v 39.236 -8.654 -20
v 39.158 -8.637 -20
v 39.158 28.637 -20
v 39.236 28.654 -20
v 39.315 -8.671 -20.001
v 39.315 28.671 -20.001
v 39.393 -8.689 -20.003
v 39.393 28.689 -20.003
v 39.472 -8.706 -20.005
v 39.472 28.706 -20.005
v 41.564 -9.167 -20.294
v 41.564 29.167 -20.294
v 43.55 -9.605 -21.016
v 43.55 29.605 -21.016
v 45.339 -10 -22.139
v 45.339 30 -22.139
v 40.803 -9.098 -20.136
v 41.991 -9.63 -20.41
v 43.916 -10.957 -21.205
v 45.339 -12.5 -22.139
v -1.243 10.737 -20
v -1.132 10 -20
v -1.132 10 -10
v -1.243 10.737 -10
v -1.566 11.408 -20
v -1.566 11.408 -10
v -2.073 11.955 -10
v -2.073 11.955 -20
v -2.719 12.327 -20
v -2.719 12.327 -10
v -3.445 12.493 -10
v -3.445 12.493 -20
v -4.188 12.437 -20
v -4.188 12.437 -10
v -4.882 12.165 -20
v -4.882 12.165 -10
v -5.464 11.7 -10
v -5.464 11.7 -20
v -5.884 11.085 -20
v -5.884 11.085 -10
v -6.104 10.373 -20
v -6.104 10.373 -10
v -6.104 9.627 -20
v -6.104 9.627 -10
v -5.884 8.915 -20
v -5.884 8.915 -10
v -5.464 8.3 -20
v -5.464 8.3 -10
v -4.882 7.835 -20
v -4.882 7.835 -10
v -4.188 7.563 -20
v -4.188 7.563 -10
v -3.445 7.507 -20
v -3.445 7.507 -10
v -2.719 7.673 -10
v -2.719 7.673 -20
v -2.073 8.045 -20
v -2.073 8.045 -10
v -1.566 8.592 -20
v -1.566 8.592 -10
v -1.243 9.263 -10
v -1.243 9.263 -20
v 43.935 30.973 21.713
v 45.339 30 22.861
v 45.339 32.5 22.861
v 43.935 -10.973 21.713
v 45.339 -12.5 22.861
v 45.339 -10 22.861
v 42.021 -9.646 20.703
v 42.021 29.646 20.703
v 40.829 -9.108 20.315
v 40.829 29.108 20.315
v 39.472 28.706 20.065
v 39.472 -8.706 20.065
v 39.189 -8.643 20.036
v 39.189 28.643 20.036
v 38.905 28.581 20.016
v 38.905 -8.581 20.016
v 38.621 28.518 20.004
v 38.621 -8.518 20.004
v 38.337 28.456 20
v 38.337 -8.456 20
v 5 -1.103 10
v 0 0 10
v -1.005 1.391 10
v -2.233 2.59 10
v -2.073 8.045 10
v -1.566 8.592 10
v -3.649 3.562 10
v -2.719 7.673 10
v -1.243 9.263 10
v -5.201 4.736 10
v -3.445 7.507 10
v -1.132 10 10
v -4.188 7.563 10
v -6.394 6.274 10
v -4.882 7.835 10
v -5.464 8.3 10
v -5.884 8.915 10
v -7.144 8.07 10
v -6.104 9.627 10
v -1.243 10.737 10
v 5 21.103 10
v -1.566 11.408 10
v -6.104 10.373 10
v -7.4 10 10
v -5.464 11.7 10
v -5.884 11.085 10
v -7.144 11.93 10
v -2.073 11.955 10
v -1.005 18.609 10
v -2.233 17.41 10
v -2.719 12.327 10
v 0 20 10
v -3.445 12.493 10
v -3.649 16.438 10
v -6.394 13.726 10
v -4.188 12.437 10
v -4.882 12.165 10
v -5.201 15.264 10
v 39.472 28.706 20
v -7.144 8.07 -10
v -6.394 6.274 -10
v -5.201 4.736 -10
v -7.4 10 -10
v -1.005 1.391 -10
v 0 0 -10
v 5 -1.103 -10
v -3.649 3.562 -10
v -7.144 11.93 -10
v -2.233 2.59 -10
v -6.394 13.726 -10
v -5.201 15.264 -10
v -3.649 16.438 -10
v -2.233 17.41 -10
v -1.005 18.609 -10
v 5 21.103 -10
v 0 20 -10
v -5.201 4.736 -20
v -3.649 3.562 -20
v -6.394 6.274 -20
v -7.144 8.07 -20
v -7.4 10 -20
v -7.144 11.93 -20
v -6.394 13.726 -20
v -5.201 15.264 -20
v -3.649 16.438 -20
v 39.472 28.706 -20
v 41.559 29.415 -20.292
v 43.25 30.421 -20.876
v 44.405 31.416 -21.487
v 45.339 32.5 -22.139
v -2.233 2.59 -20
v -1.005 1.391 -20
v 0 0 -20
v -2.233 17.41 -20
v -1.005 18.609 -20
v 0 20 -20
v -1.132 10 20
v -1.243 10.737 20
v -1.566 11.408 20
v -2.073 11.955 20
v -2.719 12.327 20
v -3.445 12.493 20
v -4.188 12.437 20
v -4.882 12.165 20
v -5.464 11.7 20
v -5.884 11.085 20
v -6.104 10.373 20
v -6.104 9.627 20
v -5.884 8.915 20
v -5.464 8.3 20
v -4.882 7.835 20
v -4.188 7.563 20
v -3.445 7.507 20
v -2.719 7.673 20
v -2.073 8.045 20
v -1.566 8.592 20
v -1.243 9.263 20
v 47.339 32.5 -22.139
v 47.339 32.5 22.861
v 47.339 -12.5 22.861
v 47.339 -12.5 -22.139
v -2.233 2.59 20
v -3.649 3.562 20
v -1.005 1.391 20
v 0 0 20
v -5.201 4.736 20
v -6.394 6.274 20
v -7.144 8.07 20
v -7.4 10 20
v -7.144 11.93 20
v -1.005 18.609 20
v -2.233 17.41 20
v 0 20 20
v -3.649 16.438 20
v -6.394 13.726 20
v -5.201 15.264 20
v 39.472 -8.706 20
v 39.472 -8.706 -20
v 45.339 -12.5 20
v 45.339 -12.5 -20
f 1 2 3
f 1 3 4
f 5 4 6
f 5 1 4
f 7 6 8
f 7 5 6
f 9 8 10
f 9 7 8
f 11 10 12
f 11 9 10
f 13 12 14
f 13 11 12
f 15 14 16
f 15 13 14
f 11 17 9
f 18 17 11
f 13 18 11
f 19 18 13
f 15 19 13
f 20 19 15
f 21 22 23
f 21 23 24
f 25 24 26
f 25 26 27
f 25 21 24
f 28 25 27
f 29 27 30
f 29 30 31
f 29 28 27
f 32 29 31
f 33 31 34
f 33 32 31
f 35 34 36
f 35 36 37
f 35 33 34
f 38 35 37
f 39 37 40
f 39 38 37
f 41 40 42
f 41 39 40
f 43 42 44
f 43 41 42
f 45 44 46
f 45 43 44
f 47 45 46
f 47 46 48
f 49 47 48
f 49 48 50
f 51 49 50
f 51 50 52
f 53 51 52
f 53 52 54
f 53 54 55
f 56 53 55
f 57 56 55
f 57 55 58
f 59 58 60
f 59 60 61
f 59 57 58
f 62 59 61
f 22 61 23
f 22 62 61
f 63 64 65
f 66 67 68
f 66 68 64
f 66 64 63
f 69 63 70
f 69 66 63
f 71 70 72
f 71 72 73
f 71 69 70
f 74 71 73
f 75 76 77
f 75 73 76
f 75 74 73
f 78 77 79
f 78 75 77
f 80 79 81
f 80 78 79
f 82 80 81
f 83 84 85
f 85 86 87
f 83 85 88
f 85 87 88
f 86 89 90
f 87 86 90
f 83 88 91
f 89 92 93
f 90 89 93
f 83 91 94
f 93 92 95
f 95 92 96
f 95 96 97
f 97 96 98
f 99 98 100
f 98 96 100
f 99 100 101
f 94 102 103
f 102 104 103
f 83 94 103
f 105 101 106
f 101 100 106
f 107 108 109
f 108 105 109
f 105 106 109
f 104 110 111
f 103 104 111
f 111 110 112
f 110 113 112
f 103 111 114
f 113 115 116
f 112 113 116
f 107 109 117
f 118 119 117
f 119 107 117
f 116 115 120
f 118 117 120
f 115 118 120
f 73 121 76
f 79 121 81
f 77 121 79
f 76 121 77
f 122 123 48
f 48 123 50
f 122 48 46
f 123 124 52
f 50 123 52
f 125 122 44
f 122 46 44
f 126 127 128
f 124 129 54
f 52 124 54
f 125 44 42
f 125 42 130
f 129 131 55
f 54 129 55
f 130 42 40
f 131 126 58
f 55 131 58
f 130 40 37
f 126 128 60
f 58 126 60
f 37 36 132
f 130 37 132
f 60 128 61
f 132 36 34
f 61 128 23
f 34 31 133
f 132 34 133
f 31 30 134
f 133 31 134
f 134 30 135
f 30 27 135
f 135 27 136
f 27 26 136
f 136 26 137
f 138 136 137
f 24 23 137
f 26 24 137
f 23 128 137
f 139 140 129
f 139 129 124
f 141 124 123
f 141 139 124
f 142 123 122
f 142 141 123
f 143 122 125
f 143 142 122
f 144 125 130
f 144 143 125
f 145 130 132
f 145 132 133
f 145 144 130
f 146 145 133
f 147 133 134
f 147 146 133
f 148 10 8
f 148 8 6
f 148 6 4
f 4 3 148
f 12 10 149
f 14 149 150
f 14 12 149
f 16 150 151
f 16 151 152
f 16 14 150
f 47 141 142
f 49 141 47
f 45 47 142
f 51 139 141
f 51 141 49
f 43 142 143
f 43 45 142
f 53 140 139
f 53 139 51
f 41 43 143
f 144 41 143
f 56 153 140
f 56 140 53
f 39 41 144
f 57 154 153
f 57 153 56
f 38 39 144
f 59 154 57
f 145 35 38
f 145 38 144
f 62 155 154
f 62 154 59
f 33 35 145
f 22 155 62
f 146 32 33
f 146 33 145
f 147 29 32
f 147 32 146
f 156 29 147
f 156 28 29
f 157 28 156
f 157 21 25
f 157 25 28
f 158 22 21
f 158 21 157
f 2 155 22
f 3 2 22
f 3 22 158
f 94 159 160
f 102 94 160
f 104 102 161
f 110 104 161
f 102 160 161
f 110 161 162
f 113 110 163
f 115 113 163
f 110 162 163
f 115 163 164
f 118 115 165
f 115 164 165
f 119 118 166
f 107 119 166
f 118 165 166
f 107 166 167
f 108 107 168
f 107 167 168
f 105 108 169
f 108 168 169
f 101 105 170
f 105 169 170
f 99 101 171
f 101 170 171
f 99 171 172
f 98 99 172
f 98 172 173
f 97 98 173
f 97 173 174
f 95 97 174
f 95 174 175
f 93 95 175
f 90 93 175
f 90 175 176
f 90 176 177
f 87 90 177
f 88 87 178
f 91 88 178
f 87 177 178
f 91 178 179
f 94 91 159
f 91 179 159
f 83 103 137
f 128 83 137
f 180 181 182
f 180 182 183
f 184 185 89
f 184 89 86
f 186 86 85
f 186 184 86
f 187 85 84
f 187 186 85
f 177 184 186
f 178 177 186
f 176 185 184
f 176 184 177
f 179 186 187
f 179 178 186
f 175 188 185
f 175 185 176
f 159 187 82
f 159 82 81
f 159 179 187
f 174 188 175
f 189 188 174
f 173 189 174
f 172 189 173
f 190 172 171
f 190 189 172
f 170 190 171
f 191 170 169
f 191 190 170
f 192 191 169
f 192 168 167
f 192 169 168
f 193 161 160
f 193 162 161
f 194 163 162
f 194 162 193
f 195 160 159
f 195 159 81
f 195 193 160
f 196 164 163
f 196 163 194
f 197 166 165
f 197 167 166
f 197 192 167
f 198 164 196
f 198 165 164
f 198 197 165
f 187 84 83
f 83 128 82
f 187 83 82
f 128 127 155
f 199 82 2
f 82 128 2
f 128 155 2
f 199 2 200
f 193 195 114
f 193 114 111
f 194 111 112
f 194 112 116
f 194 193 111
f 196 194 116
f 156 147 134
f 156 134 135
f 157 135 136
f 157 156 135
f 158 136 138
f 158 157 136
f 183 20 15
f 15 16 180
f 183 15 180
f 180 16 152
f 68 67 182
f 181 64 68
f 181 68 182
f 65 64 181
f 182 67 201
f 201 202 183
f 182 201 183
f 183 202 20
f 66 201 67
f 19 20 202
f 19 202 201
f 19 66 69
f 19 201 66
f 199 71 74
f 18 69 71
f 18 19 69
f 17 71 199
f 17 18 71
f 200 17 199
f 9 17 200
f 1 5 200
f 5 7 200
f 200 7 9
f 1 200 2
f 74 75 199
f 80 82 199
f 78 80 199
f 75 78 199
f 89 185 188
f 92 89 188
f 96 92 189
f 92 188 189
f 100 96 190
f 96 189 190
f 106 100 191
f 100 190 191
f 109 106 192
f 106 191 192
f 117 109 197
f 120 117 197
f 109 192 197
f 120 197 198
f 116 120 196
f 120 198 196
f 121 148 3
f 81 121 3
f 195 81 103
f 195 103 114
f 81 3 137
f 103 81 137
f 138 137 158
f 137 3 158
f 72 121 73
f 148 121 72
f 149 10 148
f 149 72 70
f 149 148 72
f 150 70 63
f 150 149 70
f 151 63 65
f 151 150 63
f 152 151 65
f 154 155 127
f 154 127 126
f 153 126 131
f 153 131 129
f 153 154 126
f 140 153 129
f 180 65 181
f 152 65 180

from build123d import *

# Parameters (mm, degrees)
BOSS_EXTRUDE1_DEPTH      = 20
BOSS_EXTRUDE1_DEPTH_BACK = 20
SKETCH2_W                = 45
SKETCH2_H                = 45
BOSS_EXTRUDE2_DEPTH      = 2
SKETCH3_R                = 2.5
BOSS_EXTRUDE3_DEPTH      = 10
FILLET1_R                = 10
FILLET2_R                = 10
FILLET1_OF_MIRROR1_R     = 10
CUT_EXTRUDE1_DEPTH       = 5


with BuildPart() as part:
    # Sketch1 → Boss-Extrude1 (new, two sides: drawn at the far end of the back side and taken through both)
    with BuildSketch(Plane.XY.offset(-BOSS_EXTRUDE1_DEPTH_BACK)):
        Polygon((0, 0), (45.339322565, -10), (45.339322565, 30), (0, 20), align=None)
    extrude(amount=BOSS_EXTRUDE1_DEPTH + BOSS_EXTRUDE1_DEPTH_BACK)

    # Sketch2 → Boss-Extrude2 (add)
    with BuildSketch(Plane(origin=(45.339322565, 0, 0), x_dir=(0, 0, -1), z_dir=(1, 0, 0))):
        with Locations((-0.360618032, 10)):
            Rectangle(SKETCH2_W, SKETCH2_H)
    extrude(amount=BOSS_EXTRUDE2_DEPTH)

    # Sketch3 → Boss-Extrude3 (add)
    with BuildSketch(Plane.XY.offset(20)):
        with BuildLine():
            Line((0, 17.400398526), (0, 2.599601474))
            ThreePointArc((0, 2.599601474), (-7.400398526, 10), (0, 17.400398526))
        make_face()
        with Locations((-3.63186502, 10)):
            Circle(SKETCH3_R, mode=Mode.SUBTRACT)
    boss_extrude3 = extrude(amount=-BOSS_EXTRUDE3_DEPTH)

    # Fillet1
    # the kernel refuses this fillet: 10 mm, written as the material it adds along each edge
    with BuildSketch(Plane(origin=(0, 17.400398526, 20), x_dir=(0, 1, 0), z_dir=(0, 0, -1))) as fillet1_piece_1:
        with BuildLine():
            CenterArc((7.738294917, -8.578684614), FILLET1_R, 120.92191029, 29.539044855)
            Line((-0.961904346, -3.64851902), (-1.135908331, -3.549915708))
            ThreePointArc((-1.135908331, -3.549915708), (-0.437907417, -1.835607933), (-0.2, 0))
            Line((-0.2, 0), (0, 0.2))
            ThreePointArc((0, 0.2), (1.299800737, 0.2), (2.496827605, 0.171573692))
            Line((2.496827605, 0.171573692), (2.599601474, 0))
        make_face()
    extrude(amount=10)
    with BuildSketch(Plane(origin=(0, 2.599601474, 20), x_dir=(0, -1, 0), z_dir=(0, 0, -1))) as fillet1_piece_2:
        with BuildLine():
            CenterArc((7.738294917, 8.578684614), FILLET1_R, 209.539044855, 29.539044855)
            Line((-0.961904346, 3.64851902), (-1.135908331, 3.549915708))
            ThreePointArc((-1.135908331, 3.549915708), (-0.437907417, 1.835607933), (-0.2, 0))
            Line((-0.2, 0), (0, -0.2))
            ThreePointArc((0, -0.2), (1.299800737, -0.2), (2.496827605, -0.171573692))
            Line((2.496827605, -0.171573692), (2.599601474, 0))
        make_face()
    extrude(amount=10)

    # Fillet2
    # the kernel refuses this fillet: 10 mm, written as the material it adds along each edge
    with BuildSketch(Plane(origin=(45.339322565, -25.45369781, -20), x_dir=(0, 0, -1), z_dir=(0, 1, 0))) as fillet2_piece_1_section:
        with BuildLine():
            CenterArc((10, 6.181479124), FILLET2_R, 180, 38.181011009)
            Line((0, 6.181479124), (-0.2, 6.181479124))
            Line((-0.2, 6.181479124), (-0.2, 0))
            Line((-0.2, 0), (0, -0.2))
            ThreePointArc((0, -0.2), (1.069690984, -0.2), (1.982169608, -0.123629582))
            Line((1.982169608, -0.123629582), (2.139381968, 0))
        make_face()
    fillet2_piece_1 = extrude(amount=70.907395619, mode=Mode.PRIVATE)
    fillet2_piece_1 = split(fillet2_piece_1, bisect_by=Plane(origin=(39.504780755, 28.713138732, -20.498392339), z_dir=(0.21538252084274712, -0.9765297587454381, 0)), keep=Keep.TOP, mode=Mode.PRIVATE)
    fillet2_piece_1 = split(fillet2_piece_1, bisect_by=Plane(origin=(39.504780755, -8.713138732, -20.498392339), z_dir=(0.21538252084274712, 0.9765297587454381, 0)), keep=Keep.TOP, mode=Mode.PRIVATE)
    add(fillet2_piece_1)
    with BuildSketch(Plane(origin=(45.339322565, -27.505217992, 20), x_dir=(0, 0, 1), z_dir=(0, 1, 0))) as fillet2_piece_2_section:
        with BuildLine():
            CenterArc((10, -7.002087197), FILLET2_R, 135.556247991, 44.443752009)
            Line((0, -7.002087197), (-0.2, -7.002087197))
            Line((-0.2, -7.002087197), (-0.2, 0))
            Line((-0.2, 0), (0, 0.2))
            ThreePointArc((0, 0.2), (1.430309016, 0.2), (2.717830392, 0.140041744))
            Line((2.717830392, 0.140041744), (2.860618032, 0))
        make_face()
    fillet2_piece_2 = extrude(amount=75.010435984, mode=Mode.PRIVATE)
    fillet2_piece_2 = split(fillet2_piece_2, bisect_by=Plane(origin=(39.36542439, 28.682402419, 20.709590356), z_dir=(0.21538252084274712, -0.9765297587454381, 0)), keep=Keep.TOP, mode=Mode.PRIVATE)
    fillet2_piece_2 = split(fillet2_piece_2, bisect_by=Plane(origin=(39.36542439, -8.682402419, 20.709590356), z_dir=(0.21538252084274712, 0.9765297587454381, 0)), keep=Keep.TOP, mode=Mode.PRIVATE)
    add(fillet2_piece_2)
    with BuildSketch(Plane(origin=(45.339322565, -10, -20), x_dir=(0, -1, 0), z_dir=(0, 0, 1))) as fillet2_piece_3:
        with BuildLine():
            CenterArc((8.471109431, -8.021586636), FILLET2_R, 126.663263197, 40.898766881)
            Line((-1.294188156, -5.867761428), (-1.489494108, -5.824684924))
            Line((-1.489494108, -5.824684924), (-0.195305952, 0.043076504))
            Line((-0.195305952, 0.043076504), (0, 0.2))
            ThreePointArc((0, 0.2), (1.25, 0.2), (2.380577811, 0.160431733))
            Line((2.380577811, 0.160431733), (2.5, 0))
        make_face()
    extrude(amount=40)
    with BuildSketch(Plane(origin=(45.339322565, 30, -20), x_dir=(-0.9765297587454381, -0.2153825208427468, 0), z_dir=(0, 0, 1))) as fillet2_piece_4:
        with BuildLine():
            CenterArc((6.008789159, -10), FILLET2_R, 90, 40.898766881)
            Line((-0.538456302, -2.441324397), (-0.669401211, -2.290150885))
            ThreePointArc((-0.669401211, -2.290150885), (-0.464534103, -1.177585694), (-0.195305952, 0.043076504))
            Line((-0.195305952, 0.043076504), (0, 0.2))
            Line((0, 0.2), (6.008789159, 0.2))
            Line((6.008789159, 0.2), (6.008789159, 0))
        make_face()
    extrude(amount=40)
    with BuildSketch(Plane(origin=(45.339322565, -10, -35.021972897), x_dir=(0, -1, 0), z_dir=(0, 0, 1))) as fillet2_piece_5a_section:
        with BuildLine():
            CenterArc((8.471109431, -8.021586636), FILLET2_R, 126.663263197, 40.898766881)
            Line((-1.294188156, -5.867761428), (-1.489494108, -5.824684924))
            Line((-1.489494108, -5.824684924), (-0.195305952, 0.043076504))
            Line((-0.195305952, 0.043076504), (0, 0.2))
            ThreePointArc((0, 0.2), (1.25, 0.2), (2.380577811, 0.160431733))
            Line((2.380577811, 0.160431733), (2.5, 0))
        make_face()
    fillet2_piece_5a = extrude(amount=55.021972897, mode=Mode.PRIVATE)
    fillet2_piece_5a = split(fillet2_piece_5a, bisect_by=Plane(origin=(43.769128199, -10.239106688, -22.139381968), z_dir=(0, 0, 1)), keep=Keep.TOP, mode=Mode.PRIVATE)
    fillet2_piece_5a = split(fillet2_piece_5a, bisect_by=Plane(origin=(43.769128199, -10.239106688, -20), z_dir=(0, 0, -1)), keep=Keep.TOP, mode=Mode.PRIVATE)
    with BuildSketch(Plane(origin=(45.339322565, -25.45369781, -20), x_dir=(0, 0, -1), z_dir=(0, 1, 0))) as fillet2_piece_5b_section:
        with BuildLine():
            CenterArc((10, 6.181479124), FILLET2_R, 180, 38.181011009)
            Line((0, 6.181479124), (-0.2, 6.181479124))
            Line((-0.2, 6.181479124), (-0.2, 0))
            Line((-0.2, 0), (0, -0.2))
            ThreePointArc((0, -0.2), (1.069690984, -0.2), (1.982169608, -0.123629582))
            Line((1.982169608, -0.123629582), (2.139381968, 0))
        make_face()
    fillet2_piece_5b = extrude(amount=70.907395619, mode=Mode.PRIVATE)
    fillet2_piece_5b = split(fillet2_piece_5b, bisect_by=Plane(origin=(43.426536719, -12.5, -20.45631317), z_dir=(0, 1, 0)), keep=Keep.TOP, mode=Mode.PRIVATE)
    fillet2_piece_5b = split(fillet2_piece_5b, bisect_by=Plane(origin=(43.733812734, -9.645890203, -20.45631317), z_dir=(-0.21538252084274712, -0.9765297587454381, 0)), keep=Keep.TOP, mode=Mode.PRIVATE)
    fillet2_piece_5 = fillet2_piece_5a & fillet2_piece_5b
    add(fillet2_piece_5)
    with BuildSketch(Plane(origin=(45.339322565, 30, -35.021972897), x_dir=(-0.9765297587454381, -0.2153825208427468, 0), z_dir=(0, 0, 1))) as fillet2_piece_6a_section:
        with BuildLine():
            CenterArc((6.008789159, -10), FILLET2_R, 90, 40.898766881)
            Line((-0.538456302, -2.441324397), (-0.669401211, -2.290150885))
            ThreePointArc((-0.669401211, -2.290150885), (-0.464534103, -1.177585694), (-0.195305952, 0.043076504))
            Line((-0.195305952, 0.043076504), (0, 0.2))
            Line((0, 0.2), (6.008789159, 0.2))
            Line((6.008789159, 0.2), (6.008789159, 0))
        make_face()
    fillet2_piece_6a = extrude(amount=55.021972897, mode=Mode.PRIVATE)
    fillet2_piece_6a = split(fillet2_piece_6a, bisect_by=Plane(origin=(43.769128199, 30.239106688, -20), z_dir=(0, 0, -1)), keep=Keep.TOP, mode=Mode.PRIVATE)
    fillet2_piece_6a = split(fillet2_piece_6a, bisect_by=Plane(origin=(43.769128199, 30.239106688, -22.139381968), z_dir=(0, 0, 1)), keep=Keep.TOP, mode=Mode.PRIVATE)
    with BuildSketch(Plane(origin=(45.339322565, -25.45369781, -20), x_dir=(0, 0, -1), z_dir=(0, 1, 0))) as fillet2_piece_6b_section:
        with BuildLine():
            CenterArc((10, 6.181479124), FILLET2_R, 180, 38.181011009)
            Line((0, 6.181479124), (-0.2, 6.181479124))
            Line((-0.2, 6.181479124), (-0.2, 0))
            Line((-0.2, 0), (0, -0.2))
            ThreePointArc((0, -0.2), (1.069690984, -0.2), (1.982169608, -0.123629582))
            Line((1.982169608, -0.123629582), (2.139381968, 0))
        make_face()
    fillet2_piece_6b = extrude(amount=70.907395619, mode=Mode.PRIVATE)
    fillet2_piece_6b = split(fillet2_piece_6b, bisect_by=Plane(origin=(43.733812734, 29.645890203, -20.45631317), z_dir=(-0.21538252084274712, 0.9765297587454381, 0)), keep=Keep.TOP, mode=Mode.PRIVATE)
    fillet2_piece_6b = split(fillet2_piece_6b, bisect_by=Plane(origin=(43.426536719, 32.5, -20.45631317), z_dir=(0, -1, 0)), keep=Keep.TOP, mode=Mode.PRIVATE)
    fillet2_piece_6 = fillet2_piece_6a & fillet2_piece_6b
    add(fillet2_piece_6)
    with BuildSketch(Plane(origin=(45.339322565, -10, -20), x_dir=(0, -1, 0), z_dir=(0, 0, 1))) as fillet2_piece_7a_section:
        with BuildLine():
            CenterArc((8.471109431, -8.021586636), FILLET2_R, 126.663263197, 40.898766881)
            Line((-1.294188156, -5.867761428), (-1.489494108, -5.824684924))
            Line((-1.489494108, -5.824684924), (-0.195305952, 0.043076504))
            Line((-0.195305952, 0.043076504), (0, 0.2))
            ThreePointArc((0, 0.2), (1.25, 0.2), (2.380577811, 0.160431733))
            Line((2.380577811, 0.160431733), (2.5, 0))
        make_face()
    fillet2_piece_7a = extrude(amount=55.021972897, mode=Mode.PRIVATE)
    fillet2_piece_7a = split(fillet2_piece_7a, bisect_by=Plane(origin=(43.769128199, -10.239106688, 22.860618032), z_dir=(0, 0, -1)), keep=Keep.TOP, mode=Mode.PRIVATE)
    fillet2_piece_7a = split(fillet2_piece_7a, bisect_by=Plane(origin=(43.769128199, -10.239106688, 20), z_dir=(0, 0, 1)), keep=Keep.TOP, mode=Mode.PRIVATE)
    with BuildSketch(Plane(origin=(45.339322565, -27.505217992, 20), x_dir=(0, 0, 1), z_dir=(0, 1, 0))) as fillet2_piece_7b_section:
        with BuildLine():
            CenterArc((10, -7.002087197), FILLET2_R, 135.556247991, 44.443752009)
            Line((0, -7.002087197), (-0.2, -7.002087197))
            Line((-0.2, -7.002087197), (-0.2, 0))
            Line((-0.2, 0), (0, 0.2))
            ThreePointArc((0, 0.2), (1.430309016, 0.2), (2.717830392, 0.140041744))
            Line((2.717830392, 0.140041744), (2.860618032, 0))
        make_face()
    fillet2_piece_7b = extrude(amount=75.010435984, mode=Mode.PRIVATE)
    fillet2_piece_7b = split(fillet2_piece_7b, bisect_by=Plane(origin=(43.242503202, -12.5, 20.649437077), z_dir=(0, 1, 0)), keep=Keep.TOP, mode=Mode.PRIVATE)
    fillet2_piece_7b = split(fillet2_piece_7b, bisect_by=Plane(origin=(43.554047841, -9.606241421, 20.649437077), z_dir=(-0.21538252084274712, -0.9765297587454381, 0)), keep=Keep.TOP, mode=Mode.PRIVATE)
    fillet2_piece_7 = fillet2_piece_7a & fillet2_piece_7b
    add(fillet2_piece_7)
    with BuildSketch(Plane(origin=(45.339322565, 30, -20), x_dir=(-0.9765297587454381, -0.2153825208427468, 0), z_dir=(0, 0, 1))) as fillet2_piece_8a_section:
        with BuildLine():
            CenterArc((6.008789159, -10), FILLET2_R, 90, 40.898766881)
            Line((-0.538456302, -2.441324397), (-0.669401211, -2.290150885))
            ThreePointArc((-0.669401211, -2.290150885), (-0.464534103, -1.177585694), (-0.195305952, 0.043076504))
            Line((-0.195305952, 0.043076504), (0, 0.2))
            Line((0, 0.2), (6.008789159, 0.2))
            Line((6.008789159, 0.2), (6.008789159, 0))
        make_face()
    fillet2_piece_8a = extrude(amount=55.021972897, mode=Mode.PRIVATE)
    fillet2_piece_8a = split(fillet2_piece_8a, bisect_by=Plane(origin=(43.769128199, 30.239106688, 20), z_dir=(0, 0, 1)), keep=Keep.TOP, mode=Mode.PRIVATE)
    fillet2_piece_8a = split(fillet2_piece_8a, bisect_by=Plane(origin=(43.769128199, 30.239106688, 22.860618032), z_dir=(0, 0, -1)), keep=Keep.TOP, mode=Mode.PRIVATE)
    with BuildSketch(Plane(origin=(45.339322565, -27.505217992, 20), x_dir=(0, 0, 1), z_dir=(0, 1, 0))) as fillet2_piece_8b_section:
        with BuildLine():
            CenterArc((10, -7.002087197), FILLET2_R, 135.556247991, 44.443752009)
            Line((0, -7.002087197), (-0.2, -7.002087197))
            Line((-0.2, -7.002087197), (-0.2, 0))
            Line((-0.2, 0), (0, 0.2))
            ThreePointArc((0, 0.2), (1.430309016, 0.2), (2.717830392, 0.140041744))
            Line((2.717830392, 0.140041744), (2.860618032, 0))
        make_face()
    fillet2_piece_8b = extrude(amount=75.010435984, mode=Mode.PRIVATE)
    fillet2_piece_8b = split(fillet2_piece_8b, bisect_by=Plane(origin=(43.554047841, 29.606241421, 20.649437077), z_dir=(-0.21538252084274712, 0.9765297587454381, 0)), keep=Keep.TOP, mode=Mode.PRIVATE)
    fillet2_piece_8b = split(fillet2_piece_8b, bisect_by=Plane(origin=(43.242503202, 32.5, 20.649437077), z_dir=(0, -1, 0)), keep=Keep.TOP, mode=Mode.PRIVATE)
    fillet2_piece_8 = fillet2_piece_8a & fillet2_piece_8b
    add(fillet2_piece_8)

    # Mirror1: Boss-Extrude3 across plane
    add(boss_extrude3.mirror(Plane.XY))

    # Fillet1 of Mirror1
    # the kernel refuses this fillet: 10 mm, written as the material it adds along each edge
    with BuildSketch(Plane(origin=(0, 17.400398526, -20), x_dir=(0, 1, 0), z_dir=(0, 0, 1))) as fillet1_of_mirror1_piece_1:
        with BuildLine():
            CenterArc((7.738294917, 8.578684614), FILLET1_OF_MIRROR1_R, 209.539044855, 29.539044855)
            Line((-0.961904346, 3.64851902), (-1.135908331, 3.549915708))
            ThreePointArc((-1.135908331, 3.549915708), (-0.437907417, 1.835607933), (-0.2, 0))
            Line((-0.2, 0), (0, -0.2))
            ThreePointArc((0, -0.2), (1.299800737, -0.2), (2.496827605, -0.171573692))
            Line((2.496827605, -0.171573692), (2.599601474, 0))
        make_face()
    extrude(amount=10)
    with BuildSketch(Plane(origin=(0, 2.599601474, -20), x_dir=(0, -1, 0), z_dir=(0, 0, 1))) as fillet1_of_mirror1_piece_2:
        with BuildLine():
            CenterArc((7.738294917, -8.578684614), FILLET1_OF_MIRROR1_R, 120.92191029, 29.539044855)
            Line((-0.961904346, -3.64851902), (-1.135908331, -3.549915708))
            ThreePointArc((-1.135908331, -3.549915708), (-0.437907417, -1.835607933), (-0.2, 0))
            Line((-0.2, 0), (0, 0.2))
            ThreePointArc((0, 0.2), (1.299800737, 0.2), (2.496827605, 0.171573692))
            Line((2.496827605, 0.171573692), (2.599601474, 0))
        make_face()
    extrude(amount=10)

    # Sketch4 → Cut-Extrude1 (cut)
    with BuildSketch(Plane.ZY):
        Polygon((-10, 20), (-10, 23.785509991), (10, 23.785509991), (10, 20), (10, 0), (10, -3.785509991), (-10, -3.785509991), (-10, 0), align=None)
    extrude(amount=-CUT_EXTRUDE1_DEPTH, mode=Mode.SUBTRACT)


solid = part.part
